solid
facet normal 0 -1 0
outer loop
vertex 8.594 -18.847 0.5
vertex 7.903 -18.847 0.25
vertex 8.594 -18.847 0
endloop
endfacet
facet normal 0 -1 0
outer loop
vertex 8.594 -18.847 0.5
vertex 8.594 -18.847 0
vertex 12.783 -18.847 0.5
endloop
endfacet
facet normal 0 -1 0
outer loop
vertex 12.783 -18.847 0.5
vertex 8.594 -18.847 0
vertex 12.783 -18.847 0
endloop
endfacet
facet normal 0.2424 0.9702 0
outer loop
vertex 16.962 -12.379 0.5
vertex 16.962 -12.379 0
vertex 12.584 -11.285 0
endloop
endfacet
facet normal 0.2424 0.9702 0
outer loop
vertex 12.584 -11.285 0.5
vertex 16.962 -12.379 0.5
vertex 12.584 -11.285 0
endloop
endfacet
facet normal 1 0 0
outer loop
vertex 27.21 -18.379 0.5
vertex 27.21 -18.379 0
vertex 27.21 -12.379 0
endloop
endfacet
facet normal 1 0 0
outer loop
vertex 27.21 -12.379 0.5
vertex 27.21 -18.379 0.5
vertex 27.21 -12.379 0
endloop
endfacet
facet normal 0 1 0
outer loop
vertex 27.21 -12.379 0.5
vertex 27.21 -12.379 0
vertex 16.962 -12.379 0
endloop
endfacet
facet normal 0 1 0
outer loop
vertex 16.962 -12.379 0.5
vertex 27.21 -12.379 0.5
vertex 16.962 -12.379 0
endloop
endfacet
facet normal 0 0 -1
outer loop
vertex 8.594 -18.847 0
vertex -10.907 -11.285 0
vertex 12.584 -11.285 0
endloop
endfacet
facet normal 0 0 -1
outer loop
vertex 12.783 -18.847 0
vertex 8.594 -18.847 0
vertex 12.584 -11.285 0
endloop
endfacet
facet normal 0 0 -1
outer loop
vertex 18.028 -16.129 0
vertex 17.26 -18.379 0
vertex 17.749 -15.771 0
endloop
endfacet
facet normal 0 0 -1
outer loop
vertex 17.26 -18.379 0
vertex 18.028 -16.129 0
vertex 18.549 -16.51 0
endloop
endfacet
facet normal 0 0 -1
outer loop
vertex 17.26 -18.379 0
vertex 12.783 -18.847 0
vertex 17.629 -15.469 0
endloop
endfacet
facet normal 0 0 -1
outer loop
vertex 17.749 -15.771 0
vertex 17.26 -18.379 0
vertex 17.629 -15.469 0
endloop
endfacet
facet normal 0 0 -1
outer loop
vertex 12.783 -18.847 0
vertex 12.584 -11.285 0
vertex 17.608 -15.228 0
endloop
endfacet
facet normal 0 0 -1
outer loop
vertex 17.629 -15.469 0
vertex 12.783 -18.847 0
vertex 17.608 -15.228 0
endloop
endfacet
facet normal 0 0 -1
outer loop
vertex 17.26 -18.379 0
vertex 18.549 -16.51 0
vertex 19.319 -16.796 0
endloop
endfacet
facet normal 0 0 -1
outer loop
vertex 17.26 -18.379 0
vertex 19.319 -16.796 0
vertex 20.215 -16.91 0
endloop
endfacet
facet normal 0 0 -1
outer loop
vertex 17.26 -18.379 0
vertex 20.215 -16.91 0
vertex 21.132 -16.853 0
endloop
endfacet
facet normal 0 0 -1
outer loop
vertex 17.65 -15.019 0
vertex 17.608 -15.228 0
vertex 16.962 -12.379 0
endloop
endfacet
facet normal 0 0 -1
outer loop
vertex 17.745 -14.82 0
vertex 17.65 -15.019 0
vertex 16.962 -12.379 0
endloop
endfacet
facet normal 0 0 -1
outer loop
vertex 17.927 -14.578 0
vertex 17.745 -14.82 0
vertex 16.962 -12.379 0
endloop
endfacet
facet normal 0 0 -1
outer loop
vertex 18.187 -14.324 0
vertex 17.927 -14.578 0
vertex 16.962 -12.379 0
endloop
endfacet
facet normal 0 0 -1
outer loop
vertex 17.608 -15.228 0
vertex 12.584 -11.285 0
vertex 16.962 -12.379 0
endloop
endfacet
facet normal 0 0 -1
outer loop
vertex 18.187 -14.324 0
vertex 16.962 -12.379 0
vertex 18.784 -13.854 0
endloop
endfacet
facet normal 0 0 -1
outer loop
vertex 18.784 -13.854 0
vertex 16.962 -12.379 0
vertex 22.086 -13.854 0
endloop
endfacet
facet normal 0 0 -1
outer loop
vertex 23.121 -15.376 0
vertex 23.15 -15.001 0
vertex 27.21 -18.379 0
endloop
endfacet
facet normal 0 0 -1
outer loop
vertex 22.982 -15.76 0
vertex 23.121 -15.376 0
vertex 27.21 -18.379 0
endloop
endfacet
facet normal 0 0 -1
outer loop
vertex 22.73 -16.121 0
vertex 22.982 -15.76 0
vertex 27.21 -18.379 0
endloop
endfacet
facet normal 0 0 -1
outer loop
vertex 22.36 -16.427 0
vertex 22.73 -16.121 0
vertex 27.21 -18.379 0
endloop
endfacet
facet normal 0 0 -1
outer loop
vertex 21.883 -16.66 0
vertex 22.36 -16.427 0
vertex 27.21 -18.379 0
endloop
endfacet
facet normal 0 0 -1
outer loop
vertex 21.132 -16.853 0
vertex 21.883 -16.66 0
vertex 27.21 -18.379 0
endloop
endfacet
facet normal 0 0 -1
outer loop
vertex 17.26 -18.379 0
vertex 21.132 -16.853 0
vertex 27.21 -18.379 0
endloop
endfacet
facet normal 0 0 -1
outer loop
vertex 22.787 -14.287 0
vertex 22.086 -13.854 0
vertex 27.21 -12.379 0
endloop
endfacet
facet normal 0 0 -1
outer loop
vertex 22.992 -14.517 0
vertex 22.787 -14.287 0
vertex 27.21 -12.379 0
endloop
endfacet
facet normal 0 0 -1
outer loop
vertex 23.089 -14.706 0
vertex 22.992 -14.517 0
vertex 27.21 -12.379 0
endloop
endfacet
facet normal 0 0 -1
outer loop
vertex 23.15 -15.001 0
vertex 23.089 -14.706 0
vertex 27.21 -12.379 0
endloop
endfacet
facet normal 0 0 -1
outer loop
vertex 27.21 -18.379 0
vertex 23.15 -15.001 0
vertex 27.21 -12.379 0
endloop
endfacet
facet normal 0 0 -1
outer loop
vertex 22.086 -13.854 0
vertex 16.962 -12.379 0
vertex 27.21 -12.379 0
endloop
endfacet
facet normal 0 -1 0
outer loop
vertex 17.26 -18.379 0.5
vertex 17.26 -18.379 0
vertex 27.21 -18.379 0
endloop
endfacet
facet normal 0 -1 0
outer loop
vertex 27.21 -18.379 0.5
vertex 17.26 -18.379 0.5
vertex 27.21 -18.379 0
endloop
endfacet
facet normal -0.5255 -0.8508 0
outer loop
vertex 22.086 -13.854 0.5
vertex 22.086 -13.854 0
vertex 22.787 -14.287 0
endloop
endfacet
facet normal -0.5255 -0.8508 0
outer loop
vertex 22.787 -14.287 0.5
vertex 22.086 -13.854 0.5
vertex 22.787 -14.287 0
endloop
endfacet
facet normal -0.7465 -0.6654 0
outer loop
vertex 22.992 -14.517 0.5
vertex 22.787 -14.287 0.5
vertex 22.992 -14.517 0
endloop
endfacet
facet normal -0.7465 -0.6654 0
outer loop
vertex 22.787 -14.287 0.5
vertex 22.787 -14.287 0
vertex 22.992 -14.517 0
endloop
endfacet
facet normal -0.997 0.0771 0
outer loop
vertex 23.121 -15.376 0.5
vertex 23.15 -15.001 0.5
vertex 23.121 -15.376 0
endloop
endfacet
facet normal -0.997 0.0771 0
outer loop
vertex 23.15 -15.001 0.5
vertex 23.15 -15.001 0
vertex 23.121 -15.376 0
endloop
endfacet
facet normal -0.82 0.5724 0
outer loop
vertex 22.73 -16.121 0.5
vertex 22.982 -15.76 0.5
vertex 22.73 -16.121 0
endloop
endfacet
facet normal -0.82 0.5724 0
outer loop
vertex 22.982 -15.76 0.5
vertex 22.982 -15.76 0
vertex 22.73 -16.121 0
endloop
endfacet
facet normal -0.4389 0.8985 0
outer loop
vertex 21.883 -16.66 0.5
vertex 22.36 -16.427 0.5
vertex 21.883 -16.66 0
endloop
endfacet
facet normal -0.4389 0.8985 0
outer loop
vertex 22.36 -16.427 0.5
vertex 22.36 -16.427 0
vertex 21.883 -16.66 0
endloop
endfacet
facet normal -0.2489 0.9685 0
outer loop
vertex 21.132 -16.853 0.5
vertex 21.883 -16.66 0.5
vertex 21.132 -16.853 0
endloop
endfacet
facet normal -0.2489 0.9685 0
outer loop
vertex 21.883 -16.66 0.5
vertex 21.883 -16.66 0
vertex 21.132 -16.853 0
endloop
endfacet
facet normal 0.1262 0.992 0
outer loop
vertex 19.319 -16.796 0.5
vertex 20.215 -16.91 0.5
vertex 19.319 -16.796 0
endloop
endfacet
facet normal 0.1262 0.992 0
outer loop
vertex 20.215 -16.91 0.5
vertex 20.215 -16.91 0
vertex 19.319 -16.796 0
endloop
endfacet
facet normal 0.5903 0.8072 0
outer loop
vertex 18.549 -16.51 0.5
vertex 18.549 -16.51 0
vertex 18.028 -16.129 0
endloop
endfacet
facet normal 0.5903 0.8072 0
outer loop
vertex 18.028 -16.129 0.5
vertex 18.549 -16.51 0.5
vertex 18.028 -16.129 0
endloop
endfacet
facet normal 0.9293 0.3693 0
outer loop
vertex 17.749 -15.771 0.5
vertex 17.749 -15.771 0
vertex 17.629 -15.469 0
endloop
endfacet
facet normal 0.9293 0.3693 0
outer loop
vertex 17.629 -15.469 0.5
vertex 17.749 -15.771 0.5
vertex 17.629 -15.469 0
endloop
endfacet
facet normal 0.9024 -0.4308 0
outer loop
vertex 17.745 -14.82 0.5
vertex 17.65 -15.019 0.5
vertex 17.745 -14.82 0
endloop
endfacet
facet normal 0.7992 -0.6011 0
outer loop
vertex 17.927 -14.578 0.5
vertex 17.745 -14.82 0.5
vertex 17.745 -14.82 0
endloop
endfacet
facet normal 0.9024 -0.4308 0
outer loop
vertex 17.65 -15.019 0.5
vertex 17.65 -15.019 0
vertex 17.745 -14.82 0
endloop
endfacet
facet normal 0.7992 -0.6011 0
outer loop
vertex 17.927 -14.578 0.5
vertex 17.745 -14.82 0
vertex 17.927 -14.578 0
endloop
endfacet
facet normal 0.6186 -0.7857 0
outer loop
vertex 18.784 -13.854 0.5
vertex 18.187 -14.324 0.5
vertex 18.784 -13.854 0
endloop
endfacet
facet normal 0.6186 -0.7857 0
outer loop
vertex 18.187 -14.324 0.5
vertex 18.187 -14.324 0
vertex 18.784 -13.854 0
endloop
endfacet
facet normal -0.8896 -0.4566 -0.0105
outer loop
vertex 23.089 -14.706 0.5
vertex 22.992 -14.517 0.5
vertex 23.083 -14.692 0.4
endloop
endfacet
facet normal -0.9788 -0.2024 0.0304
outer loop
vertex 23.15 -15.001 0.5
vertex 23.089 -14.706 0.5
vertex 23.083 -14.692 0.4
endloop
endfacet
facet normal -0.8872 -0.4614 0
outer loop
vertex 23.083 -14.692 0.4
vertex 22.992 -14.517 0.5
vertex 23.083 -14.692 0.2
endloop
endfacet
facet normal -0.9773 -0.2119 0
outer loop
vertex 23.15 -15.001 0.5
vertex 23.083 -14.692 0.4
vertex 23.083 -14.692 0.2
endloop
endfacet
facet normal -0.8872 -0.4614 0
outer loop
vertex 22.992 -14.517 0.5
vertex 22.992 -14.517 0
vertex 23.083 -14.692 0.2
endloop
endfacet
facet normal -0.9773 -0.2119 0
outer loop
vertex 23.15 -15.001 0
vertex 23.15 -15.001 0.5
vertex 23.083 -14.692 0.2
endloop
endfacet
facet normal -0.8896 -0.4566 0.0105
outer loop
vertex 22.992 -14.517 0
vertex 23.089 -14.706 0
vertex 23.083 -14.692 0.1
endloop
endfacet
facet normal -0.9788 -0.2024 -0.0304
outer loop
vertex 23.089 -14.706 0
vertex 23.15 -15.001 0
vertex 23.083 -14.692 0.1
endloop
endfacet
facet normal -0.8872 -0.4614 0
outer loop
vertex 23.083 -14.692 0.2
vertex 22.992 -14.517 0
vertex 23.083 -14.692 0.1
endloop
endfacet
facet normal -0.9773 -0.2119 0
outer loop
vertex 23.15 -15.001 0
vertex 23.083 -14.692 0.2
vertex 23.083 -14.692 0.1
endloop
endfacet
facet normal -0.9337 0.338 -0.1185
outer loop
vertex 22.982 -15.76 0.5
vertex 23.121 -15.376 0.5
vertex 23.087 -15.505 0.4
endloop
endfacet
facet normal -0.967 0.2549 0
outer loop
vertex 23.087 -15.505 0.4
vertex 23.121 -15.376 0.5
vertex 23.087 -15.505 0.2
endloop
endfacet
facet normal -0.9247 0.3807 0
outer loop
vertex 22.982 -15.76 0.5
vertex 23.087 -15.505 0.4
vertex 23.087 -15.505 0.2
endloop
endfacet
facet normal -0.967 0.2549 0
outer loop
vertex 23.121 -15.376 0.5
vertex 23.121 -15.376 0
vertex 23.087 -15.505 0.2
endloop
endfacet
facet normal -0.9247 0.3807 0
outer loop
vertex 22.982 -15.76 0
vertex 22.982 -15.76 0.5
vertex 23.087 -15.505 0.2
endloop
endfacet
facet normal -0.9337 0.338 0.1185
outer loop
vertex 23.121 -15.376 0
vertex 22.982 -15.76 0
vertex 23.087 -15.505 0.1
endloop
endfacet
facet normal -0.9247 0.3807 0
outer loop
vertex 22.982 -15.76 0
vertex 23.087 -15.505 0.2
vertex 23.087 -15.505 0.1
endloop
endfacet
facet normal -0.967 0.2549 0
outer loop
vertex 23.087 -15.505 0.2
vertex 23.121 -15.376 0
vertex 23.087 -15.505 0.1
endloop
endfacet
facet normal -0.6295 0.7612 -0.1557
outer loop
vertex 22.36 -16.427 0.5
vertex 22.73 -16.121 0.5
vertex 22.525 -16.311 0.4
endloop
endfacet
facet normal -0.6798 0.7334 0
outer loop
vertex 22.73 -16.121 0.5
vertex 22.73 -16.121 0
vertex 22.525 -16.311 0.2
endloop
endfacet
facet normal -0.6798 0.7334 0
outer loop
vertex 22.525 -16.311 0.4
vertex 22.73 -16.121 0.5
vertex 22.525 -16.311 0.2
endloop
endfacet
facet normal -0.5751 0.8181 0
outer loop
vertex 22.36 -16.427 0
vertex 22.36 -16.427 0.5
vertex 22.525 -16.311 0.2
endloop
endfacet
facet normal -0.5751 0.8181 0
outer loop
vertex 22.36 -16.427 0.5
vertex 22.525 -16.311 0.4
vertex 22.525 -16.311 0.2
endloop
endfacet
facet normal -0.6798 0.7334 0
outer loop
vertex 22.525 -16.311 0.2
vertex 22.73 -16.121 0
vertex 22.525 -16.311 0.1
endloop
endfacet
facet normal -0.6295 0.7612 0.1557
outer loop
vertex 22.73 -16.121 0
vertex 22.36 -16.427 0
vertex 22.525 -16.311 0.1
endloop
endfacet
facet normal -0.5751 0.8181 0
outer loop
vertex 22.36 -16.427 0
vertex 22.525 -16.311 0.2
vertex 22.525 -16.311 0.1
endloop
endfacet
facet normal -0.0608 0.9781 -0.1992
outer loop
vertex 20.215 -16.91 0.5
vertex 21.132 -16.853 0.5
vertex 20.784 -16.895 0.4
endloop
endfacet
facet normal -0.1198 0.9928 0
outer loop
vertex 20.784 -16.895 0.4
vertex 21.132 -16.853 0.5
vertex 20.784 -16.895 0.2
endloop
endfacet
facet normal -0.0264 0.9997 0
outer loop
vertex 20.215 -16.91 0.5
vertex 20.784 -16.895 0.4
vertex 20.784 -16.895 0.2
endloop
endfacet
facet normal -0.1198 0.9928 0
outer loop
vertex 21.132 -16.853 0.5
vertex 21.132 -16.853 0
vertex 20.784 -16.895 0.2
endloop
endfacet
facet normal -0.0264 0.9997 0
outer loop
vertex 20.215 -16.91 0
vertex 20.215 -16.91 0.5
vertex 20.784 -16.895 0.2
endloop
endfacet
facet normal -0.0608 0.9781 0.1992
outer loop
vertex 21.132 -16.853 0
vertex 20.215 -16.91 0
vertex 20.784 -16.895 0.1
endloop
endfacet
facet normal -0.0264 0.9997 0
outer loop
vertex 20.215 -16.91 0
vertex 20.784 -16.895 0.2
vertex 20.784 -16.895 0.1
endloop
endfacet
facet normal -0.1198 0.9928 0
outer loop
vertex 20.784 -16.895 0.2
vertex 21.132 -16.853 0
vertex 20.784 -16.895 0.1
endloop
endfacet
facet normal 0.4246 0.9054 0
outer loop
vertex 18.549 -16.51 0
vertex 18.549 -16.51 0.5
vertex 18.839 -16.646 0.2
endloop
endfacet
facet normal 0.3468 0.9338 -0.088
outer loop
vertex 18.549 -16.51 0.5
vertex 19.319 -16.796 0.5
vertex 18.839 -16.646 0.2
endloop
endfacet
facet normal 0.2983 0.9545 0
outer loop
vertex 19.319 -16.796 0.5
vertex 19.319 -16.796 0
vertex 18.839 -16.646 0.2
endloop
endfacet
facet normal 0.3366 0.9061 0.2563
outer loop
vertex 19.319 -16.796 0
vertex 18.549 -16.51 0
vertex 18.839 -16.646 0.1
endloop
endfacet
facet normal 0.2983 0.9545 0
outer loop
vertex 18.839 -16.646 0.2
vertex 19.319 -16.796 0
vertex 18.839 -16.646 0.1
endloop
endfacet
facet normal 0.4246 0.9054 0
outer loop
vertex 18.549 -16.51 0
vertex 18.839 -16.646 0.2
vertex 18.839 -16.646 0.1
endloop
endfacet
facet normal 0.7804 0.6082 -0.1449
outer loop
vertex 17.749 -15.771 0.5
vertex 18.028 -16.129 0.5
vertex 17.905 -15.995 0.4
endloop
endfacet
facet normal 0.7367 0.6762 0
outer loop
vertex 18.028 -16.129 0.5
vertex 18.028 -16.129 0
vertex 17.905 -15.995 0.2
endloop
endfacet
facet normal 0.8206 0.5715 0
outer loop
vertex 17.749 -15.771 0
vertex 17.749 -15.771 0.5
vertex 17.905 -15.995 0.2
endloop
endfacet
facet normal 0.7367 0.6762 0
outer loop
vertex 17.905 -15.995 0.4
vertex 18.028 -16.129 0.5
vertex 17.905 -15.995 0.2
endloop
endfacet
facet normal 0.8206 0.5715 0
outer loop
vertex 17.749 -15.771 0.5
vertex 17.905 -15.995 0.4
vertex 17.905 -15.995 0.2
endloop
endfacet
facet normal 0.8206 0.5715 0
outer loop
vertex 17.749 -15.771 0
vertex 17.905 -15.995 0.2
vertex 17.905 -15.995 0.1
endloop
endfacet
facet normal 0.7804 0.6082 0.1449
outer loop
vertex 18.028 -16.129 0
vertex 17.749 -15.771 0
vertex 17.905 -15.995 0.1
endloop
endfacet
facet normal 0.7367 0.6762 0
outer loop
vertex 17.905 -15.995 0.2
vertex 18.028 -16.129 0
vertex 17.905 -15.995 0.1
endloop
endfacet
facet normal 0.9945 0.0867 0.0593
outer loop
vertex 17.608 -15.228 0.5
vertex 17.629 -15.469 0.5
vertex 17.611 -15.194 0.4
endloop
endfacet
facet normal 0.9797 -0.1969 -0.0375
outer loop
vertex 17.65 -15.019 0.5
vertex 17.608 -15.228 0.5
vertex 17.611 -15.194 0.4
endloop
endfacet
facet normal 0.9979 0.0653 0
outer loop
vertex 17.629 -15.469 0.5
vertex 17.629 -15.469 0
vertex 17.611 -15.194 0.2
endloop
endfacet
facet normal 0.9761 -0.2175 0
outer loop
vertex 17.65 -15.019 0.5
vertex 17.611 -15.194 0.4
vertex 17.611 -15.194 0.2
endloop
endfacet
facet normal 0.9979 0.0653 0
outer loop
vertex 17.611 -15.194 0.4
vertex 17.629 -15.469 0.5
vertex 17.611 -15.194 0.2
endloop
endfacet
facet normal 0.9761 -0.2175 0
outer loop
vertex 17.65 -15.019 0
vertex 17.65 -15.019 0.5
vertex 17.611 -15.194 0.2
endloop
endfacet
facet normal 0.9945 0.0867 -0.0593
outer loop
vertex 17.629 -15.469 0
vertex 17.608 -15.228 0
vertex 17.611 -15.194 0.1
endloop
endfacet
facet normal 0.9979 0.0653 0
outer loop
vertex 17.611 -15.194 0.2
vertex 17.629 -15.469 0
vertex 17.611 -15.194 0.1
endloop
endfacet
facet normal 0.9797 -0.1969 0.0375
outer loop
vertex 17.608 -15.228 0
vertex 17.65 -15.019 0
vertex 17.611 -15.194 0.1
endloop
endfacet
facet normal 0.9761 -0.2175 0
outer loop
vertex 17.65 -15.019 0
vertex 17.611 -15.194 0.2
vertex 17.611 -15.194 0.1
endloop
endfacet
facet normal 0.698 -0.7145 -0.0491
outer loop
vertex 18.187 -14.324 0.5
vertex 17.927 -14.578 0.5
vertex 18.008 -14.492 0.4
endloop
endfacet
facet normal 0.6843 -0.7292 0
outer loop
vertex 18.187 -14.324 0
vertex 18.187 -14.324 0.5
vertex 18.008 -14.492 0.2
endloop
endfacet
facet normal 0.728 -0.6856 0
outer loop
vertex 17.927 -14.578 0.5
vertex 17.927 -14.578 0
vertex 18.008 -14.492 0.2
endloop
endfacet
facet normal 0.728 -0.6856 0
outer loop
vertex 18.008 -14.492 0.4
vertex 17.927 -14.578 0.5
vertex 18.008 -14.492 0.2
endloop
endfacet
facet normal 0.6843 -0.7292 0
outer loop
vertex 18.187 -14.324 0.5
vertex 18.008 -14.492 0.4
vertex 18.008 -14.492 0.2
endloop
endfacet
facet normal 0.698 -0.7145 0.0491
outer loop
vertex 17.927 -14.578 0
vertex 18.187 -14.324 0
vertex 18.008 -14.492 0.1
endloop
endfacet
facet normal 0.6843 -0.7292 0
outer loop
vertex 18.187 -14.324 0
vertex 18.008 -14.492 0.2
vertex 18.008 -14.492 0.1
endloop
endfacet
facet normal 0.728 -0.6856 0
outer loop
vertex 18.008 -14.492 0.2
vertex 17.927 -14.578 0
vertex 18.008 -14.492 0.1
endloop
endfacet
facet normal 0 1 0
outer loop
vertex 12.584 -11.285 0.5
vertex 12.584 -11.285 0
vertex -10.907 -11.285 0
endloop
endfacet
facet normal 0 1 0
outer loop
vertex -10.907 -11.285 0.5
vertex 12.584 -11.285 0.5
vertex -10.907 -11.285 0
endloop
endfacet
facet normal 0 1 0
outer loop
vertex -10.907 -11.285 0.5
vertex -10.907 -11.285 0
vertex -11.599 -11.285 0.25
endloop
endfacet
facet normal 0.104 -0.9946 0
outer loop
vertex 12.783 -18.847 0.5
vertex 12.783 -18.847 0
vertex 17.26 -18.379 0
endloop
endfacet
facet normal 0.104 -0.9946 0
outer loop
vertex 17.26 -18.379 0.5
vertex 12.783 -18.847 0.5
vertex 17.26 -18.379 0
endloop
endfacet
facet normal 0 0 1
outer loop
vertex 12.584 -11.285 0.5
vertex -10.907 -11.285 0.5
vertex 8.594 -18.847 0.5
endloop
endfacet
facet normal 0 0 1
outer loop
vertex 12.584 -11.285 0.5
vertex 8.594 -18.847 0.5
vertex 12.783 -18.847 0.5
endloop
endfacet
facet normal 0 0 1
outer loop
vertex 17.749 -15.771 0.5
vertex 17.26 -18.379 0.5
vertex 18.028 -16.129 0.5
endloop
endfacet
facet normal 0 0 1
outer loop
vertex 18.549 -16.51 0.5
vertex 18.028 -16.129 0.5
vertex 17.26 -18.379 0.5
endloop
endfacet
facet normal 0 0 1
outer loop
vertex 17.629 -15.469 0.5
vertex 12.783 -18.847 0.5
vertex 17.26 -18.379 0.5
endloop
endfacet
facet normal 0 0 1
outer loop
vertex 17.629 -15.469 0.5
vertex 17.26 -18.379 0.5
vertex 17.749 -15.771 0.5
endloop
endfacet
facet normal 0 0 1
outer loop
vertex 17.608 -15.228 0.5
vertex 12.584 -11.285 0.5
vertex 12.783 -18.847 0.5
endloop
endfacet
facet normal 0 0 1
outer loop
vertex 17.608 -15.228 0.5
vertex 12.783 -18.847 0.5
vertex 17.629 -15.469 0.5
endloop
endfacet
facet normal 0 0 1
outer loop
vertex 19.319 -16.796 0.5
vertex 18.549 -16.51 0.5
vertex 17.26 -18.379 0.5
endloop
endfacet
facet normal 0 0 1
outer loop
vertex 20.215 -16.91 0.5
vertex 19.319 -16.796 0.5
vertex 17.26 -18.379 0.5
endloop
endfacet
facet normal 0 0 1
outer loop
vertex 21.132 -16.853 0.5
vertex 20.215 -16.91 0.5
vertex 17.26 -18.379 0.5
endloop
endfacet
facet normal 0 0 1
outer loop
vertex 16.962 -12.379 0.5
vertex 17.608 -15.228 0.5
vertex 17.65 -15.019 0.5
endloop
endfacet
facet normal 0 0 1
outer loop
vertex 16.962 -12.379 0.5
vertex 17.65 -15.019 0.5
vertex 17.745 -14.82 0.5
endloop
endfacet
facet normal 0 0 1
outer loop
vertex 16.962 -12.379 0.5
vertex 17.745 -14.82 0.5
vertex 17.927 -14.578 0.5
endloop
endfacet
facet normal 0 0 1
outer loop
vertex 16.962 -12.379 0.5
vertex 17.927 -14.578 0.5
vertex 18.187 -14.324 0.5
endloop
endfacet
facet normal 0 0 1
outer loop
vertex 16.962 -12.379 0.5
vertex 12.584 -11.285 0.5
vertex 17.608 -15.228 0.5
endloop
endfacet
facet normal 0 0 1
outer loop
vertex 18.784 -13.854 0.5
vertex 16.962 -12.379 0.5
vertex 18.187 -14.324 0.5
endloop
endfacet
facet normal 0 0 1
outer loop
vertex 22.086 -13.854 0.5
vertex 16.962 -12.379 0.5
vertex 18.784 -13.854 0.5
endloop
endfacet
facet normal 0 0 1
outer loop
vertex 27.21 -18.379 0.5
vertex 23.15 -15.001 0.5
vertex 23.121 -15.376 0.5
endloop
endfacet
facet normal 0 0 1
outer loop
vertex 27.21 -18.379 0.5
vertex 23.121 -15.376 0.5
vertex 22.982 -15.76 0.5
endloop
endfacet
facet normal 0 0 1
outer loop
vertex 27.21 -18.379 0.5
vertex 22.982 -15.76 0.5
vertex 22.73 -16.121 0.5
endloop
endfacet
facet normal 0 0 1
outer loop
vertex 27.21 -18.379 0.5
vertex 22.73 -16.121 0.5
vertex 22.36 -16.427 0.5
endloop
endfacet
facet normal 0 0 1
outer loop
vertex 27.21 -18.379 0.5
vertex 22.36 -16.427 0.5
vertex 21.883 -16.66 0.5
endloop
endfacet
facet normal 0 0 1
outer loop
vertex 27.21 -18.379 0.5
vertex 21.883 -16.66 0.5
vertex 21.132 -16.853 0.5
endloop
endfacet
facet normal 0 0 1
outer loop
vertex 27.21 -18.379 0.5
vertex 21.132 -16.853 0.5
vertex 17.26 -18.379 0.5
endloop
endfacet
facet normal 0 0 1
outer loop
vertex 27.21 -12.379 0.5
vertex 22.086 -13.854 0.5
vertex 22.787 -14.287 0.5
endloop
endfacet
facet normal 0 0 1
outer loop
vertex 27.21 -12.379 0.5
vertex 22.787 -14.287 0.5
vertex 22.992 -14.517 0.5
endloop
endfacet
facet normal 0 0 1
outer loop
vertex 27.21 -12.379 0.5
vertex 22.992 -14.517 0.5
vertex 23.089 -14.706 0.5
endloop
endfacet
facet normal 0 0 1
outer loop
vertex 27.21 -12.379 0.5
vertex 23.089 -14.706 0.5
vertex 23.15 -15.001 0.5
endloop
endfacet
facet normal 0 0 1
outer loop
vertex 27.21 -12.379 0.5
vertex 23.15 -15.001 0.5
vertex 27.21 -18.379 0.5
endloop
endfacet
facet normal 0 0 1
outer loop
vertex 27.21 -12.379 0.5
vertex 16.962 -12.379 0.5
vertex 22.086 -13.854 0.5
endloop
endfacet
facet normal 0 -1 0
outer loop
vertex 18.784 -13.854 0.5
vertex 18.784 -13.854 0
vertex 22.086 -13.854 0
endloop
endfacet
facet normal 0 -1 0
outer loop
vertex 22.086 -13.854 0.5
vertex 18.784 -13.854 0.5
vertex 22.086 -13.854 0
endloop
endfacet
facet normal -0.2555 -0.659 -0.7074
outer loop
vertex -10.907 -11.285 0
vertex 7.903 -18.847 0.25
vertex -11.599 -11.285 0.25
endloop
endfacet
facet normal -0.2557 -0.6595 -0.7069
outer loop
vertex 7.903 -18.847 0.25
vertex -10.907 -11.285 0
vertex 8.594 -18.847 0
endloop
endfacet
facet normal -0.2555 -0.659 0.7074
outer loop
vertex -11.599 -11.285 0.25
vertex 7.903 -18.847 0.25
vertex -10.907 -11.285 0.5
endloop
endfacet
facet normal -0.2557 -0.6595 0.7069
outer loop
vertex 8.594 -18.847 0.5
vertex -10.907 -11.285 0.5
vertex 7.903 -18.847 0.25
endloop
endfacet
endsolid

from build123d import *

# Parameters (mm, degrees)
F1_DEPTH    = 0.5
F2_T1_DEPTH = 24.3877615645


# Not quite as in the source:
# - a fillet or chamfer that OpenCascade refuses, or shapes differently, is made with other operations: its cross-section is extruded or revolved along the edge and cut away or added


with BuildPart() as f1:
    # F0 (on Top) → F1 (new body)
    with BuildSketch(Plane.XY):
        Polygon((12.5838547959, -11.2850121383), (-12.2901993096, -11.2850121383), (7.2110601937, -18.846724632), (12.7828468132, -18.846724632), (17.260177021, -18.3794706089), (27.2098006904, -18.3794706089), (27.2098006904, -12.3794706089), (16.9616886783, -12.3794706089), align=None)
        with BuildLine():
            add(Edge.make_bspline(
                [(22.0857446844, -13.8540112255), (22.5057904818, -14.0714719098), (23.4075383771, -14.5383131818), (22.856226593, -16.8955850574), (18.716199205, -17.1776625989), (17.0863515211, -15.1231779615), (18.2240211185, -14.2724034673), (18.7835020814, -13.8540112255)],
                knots=[0, 0, 0, 0, 0.1610304719, 0.3456977548, 0.6171279231, 0.8117119076, 1, 1, 1, 1], degree=3))
            Line((18.7835020814, -13.8540112255), (22.0857446844, -13.8540112255))
        make_face(mode=Mode.SUBTRACT)
    extrude(amount=F1_DEPTH)

    # F2: chamfer of 0.5 on 2 edges, made by hand

    # F2_s2 → F2_t1 (cut)
    with BuildSketch(Plane(origin=(-8.0788192676, 3.1326032342, 0), x_dir=(0, 0, 1), z_dir=(0.932361315, -0.3615278389, 0))):
        Polygon((0, 14.9649579531), (0.5, 14.4649579531), (0.5, 14.9649579531), align=None)
        Polygon((0.5, 14.9649579531), (0, 14.4649579531), (0, 14.9649579531), align=None)
    extrude(amount=F2_T1_DEPTH, mode=Mode.SUBTRACT)


solid = f1.part
